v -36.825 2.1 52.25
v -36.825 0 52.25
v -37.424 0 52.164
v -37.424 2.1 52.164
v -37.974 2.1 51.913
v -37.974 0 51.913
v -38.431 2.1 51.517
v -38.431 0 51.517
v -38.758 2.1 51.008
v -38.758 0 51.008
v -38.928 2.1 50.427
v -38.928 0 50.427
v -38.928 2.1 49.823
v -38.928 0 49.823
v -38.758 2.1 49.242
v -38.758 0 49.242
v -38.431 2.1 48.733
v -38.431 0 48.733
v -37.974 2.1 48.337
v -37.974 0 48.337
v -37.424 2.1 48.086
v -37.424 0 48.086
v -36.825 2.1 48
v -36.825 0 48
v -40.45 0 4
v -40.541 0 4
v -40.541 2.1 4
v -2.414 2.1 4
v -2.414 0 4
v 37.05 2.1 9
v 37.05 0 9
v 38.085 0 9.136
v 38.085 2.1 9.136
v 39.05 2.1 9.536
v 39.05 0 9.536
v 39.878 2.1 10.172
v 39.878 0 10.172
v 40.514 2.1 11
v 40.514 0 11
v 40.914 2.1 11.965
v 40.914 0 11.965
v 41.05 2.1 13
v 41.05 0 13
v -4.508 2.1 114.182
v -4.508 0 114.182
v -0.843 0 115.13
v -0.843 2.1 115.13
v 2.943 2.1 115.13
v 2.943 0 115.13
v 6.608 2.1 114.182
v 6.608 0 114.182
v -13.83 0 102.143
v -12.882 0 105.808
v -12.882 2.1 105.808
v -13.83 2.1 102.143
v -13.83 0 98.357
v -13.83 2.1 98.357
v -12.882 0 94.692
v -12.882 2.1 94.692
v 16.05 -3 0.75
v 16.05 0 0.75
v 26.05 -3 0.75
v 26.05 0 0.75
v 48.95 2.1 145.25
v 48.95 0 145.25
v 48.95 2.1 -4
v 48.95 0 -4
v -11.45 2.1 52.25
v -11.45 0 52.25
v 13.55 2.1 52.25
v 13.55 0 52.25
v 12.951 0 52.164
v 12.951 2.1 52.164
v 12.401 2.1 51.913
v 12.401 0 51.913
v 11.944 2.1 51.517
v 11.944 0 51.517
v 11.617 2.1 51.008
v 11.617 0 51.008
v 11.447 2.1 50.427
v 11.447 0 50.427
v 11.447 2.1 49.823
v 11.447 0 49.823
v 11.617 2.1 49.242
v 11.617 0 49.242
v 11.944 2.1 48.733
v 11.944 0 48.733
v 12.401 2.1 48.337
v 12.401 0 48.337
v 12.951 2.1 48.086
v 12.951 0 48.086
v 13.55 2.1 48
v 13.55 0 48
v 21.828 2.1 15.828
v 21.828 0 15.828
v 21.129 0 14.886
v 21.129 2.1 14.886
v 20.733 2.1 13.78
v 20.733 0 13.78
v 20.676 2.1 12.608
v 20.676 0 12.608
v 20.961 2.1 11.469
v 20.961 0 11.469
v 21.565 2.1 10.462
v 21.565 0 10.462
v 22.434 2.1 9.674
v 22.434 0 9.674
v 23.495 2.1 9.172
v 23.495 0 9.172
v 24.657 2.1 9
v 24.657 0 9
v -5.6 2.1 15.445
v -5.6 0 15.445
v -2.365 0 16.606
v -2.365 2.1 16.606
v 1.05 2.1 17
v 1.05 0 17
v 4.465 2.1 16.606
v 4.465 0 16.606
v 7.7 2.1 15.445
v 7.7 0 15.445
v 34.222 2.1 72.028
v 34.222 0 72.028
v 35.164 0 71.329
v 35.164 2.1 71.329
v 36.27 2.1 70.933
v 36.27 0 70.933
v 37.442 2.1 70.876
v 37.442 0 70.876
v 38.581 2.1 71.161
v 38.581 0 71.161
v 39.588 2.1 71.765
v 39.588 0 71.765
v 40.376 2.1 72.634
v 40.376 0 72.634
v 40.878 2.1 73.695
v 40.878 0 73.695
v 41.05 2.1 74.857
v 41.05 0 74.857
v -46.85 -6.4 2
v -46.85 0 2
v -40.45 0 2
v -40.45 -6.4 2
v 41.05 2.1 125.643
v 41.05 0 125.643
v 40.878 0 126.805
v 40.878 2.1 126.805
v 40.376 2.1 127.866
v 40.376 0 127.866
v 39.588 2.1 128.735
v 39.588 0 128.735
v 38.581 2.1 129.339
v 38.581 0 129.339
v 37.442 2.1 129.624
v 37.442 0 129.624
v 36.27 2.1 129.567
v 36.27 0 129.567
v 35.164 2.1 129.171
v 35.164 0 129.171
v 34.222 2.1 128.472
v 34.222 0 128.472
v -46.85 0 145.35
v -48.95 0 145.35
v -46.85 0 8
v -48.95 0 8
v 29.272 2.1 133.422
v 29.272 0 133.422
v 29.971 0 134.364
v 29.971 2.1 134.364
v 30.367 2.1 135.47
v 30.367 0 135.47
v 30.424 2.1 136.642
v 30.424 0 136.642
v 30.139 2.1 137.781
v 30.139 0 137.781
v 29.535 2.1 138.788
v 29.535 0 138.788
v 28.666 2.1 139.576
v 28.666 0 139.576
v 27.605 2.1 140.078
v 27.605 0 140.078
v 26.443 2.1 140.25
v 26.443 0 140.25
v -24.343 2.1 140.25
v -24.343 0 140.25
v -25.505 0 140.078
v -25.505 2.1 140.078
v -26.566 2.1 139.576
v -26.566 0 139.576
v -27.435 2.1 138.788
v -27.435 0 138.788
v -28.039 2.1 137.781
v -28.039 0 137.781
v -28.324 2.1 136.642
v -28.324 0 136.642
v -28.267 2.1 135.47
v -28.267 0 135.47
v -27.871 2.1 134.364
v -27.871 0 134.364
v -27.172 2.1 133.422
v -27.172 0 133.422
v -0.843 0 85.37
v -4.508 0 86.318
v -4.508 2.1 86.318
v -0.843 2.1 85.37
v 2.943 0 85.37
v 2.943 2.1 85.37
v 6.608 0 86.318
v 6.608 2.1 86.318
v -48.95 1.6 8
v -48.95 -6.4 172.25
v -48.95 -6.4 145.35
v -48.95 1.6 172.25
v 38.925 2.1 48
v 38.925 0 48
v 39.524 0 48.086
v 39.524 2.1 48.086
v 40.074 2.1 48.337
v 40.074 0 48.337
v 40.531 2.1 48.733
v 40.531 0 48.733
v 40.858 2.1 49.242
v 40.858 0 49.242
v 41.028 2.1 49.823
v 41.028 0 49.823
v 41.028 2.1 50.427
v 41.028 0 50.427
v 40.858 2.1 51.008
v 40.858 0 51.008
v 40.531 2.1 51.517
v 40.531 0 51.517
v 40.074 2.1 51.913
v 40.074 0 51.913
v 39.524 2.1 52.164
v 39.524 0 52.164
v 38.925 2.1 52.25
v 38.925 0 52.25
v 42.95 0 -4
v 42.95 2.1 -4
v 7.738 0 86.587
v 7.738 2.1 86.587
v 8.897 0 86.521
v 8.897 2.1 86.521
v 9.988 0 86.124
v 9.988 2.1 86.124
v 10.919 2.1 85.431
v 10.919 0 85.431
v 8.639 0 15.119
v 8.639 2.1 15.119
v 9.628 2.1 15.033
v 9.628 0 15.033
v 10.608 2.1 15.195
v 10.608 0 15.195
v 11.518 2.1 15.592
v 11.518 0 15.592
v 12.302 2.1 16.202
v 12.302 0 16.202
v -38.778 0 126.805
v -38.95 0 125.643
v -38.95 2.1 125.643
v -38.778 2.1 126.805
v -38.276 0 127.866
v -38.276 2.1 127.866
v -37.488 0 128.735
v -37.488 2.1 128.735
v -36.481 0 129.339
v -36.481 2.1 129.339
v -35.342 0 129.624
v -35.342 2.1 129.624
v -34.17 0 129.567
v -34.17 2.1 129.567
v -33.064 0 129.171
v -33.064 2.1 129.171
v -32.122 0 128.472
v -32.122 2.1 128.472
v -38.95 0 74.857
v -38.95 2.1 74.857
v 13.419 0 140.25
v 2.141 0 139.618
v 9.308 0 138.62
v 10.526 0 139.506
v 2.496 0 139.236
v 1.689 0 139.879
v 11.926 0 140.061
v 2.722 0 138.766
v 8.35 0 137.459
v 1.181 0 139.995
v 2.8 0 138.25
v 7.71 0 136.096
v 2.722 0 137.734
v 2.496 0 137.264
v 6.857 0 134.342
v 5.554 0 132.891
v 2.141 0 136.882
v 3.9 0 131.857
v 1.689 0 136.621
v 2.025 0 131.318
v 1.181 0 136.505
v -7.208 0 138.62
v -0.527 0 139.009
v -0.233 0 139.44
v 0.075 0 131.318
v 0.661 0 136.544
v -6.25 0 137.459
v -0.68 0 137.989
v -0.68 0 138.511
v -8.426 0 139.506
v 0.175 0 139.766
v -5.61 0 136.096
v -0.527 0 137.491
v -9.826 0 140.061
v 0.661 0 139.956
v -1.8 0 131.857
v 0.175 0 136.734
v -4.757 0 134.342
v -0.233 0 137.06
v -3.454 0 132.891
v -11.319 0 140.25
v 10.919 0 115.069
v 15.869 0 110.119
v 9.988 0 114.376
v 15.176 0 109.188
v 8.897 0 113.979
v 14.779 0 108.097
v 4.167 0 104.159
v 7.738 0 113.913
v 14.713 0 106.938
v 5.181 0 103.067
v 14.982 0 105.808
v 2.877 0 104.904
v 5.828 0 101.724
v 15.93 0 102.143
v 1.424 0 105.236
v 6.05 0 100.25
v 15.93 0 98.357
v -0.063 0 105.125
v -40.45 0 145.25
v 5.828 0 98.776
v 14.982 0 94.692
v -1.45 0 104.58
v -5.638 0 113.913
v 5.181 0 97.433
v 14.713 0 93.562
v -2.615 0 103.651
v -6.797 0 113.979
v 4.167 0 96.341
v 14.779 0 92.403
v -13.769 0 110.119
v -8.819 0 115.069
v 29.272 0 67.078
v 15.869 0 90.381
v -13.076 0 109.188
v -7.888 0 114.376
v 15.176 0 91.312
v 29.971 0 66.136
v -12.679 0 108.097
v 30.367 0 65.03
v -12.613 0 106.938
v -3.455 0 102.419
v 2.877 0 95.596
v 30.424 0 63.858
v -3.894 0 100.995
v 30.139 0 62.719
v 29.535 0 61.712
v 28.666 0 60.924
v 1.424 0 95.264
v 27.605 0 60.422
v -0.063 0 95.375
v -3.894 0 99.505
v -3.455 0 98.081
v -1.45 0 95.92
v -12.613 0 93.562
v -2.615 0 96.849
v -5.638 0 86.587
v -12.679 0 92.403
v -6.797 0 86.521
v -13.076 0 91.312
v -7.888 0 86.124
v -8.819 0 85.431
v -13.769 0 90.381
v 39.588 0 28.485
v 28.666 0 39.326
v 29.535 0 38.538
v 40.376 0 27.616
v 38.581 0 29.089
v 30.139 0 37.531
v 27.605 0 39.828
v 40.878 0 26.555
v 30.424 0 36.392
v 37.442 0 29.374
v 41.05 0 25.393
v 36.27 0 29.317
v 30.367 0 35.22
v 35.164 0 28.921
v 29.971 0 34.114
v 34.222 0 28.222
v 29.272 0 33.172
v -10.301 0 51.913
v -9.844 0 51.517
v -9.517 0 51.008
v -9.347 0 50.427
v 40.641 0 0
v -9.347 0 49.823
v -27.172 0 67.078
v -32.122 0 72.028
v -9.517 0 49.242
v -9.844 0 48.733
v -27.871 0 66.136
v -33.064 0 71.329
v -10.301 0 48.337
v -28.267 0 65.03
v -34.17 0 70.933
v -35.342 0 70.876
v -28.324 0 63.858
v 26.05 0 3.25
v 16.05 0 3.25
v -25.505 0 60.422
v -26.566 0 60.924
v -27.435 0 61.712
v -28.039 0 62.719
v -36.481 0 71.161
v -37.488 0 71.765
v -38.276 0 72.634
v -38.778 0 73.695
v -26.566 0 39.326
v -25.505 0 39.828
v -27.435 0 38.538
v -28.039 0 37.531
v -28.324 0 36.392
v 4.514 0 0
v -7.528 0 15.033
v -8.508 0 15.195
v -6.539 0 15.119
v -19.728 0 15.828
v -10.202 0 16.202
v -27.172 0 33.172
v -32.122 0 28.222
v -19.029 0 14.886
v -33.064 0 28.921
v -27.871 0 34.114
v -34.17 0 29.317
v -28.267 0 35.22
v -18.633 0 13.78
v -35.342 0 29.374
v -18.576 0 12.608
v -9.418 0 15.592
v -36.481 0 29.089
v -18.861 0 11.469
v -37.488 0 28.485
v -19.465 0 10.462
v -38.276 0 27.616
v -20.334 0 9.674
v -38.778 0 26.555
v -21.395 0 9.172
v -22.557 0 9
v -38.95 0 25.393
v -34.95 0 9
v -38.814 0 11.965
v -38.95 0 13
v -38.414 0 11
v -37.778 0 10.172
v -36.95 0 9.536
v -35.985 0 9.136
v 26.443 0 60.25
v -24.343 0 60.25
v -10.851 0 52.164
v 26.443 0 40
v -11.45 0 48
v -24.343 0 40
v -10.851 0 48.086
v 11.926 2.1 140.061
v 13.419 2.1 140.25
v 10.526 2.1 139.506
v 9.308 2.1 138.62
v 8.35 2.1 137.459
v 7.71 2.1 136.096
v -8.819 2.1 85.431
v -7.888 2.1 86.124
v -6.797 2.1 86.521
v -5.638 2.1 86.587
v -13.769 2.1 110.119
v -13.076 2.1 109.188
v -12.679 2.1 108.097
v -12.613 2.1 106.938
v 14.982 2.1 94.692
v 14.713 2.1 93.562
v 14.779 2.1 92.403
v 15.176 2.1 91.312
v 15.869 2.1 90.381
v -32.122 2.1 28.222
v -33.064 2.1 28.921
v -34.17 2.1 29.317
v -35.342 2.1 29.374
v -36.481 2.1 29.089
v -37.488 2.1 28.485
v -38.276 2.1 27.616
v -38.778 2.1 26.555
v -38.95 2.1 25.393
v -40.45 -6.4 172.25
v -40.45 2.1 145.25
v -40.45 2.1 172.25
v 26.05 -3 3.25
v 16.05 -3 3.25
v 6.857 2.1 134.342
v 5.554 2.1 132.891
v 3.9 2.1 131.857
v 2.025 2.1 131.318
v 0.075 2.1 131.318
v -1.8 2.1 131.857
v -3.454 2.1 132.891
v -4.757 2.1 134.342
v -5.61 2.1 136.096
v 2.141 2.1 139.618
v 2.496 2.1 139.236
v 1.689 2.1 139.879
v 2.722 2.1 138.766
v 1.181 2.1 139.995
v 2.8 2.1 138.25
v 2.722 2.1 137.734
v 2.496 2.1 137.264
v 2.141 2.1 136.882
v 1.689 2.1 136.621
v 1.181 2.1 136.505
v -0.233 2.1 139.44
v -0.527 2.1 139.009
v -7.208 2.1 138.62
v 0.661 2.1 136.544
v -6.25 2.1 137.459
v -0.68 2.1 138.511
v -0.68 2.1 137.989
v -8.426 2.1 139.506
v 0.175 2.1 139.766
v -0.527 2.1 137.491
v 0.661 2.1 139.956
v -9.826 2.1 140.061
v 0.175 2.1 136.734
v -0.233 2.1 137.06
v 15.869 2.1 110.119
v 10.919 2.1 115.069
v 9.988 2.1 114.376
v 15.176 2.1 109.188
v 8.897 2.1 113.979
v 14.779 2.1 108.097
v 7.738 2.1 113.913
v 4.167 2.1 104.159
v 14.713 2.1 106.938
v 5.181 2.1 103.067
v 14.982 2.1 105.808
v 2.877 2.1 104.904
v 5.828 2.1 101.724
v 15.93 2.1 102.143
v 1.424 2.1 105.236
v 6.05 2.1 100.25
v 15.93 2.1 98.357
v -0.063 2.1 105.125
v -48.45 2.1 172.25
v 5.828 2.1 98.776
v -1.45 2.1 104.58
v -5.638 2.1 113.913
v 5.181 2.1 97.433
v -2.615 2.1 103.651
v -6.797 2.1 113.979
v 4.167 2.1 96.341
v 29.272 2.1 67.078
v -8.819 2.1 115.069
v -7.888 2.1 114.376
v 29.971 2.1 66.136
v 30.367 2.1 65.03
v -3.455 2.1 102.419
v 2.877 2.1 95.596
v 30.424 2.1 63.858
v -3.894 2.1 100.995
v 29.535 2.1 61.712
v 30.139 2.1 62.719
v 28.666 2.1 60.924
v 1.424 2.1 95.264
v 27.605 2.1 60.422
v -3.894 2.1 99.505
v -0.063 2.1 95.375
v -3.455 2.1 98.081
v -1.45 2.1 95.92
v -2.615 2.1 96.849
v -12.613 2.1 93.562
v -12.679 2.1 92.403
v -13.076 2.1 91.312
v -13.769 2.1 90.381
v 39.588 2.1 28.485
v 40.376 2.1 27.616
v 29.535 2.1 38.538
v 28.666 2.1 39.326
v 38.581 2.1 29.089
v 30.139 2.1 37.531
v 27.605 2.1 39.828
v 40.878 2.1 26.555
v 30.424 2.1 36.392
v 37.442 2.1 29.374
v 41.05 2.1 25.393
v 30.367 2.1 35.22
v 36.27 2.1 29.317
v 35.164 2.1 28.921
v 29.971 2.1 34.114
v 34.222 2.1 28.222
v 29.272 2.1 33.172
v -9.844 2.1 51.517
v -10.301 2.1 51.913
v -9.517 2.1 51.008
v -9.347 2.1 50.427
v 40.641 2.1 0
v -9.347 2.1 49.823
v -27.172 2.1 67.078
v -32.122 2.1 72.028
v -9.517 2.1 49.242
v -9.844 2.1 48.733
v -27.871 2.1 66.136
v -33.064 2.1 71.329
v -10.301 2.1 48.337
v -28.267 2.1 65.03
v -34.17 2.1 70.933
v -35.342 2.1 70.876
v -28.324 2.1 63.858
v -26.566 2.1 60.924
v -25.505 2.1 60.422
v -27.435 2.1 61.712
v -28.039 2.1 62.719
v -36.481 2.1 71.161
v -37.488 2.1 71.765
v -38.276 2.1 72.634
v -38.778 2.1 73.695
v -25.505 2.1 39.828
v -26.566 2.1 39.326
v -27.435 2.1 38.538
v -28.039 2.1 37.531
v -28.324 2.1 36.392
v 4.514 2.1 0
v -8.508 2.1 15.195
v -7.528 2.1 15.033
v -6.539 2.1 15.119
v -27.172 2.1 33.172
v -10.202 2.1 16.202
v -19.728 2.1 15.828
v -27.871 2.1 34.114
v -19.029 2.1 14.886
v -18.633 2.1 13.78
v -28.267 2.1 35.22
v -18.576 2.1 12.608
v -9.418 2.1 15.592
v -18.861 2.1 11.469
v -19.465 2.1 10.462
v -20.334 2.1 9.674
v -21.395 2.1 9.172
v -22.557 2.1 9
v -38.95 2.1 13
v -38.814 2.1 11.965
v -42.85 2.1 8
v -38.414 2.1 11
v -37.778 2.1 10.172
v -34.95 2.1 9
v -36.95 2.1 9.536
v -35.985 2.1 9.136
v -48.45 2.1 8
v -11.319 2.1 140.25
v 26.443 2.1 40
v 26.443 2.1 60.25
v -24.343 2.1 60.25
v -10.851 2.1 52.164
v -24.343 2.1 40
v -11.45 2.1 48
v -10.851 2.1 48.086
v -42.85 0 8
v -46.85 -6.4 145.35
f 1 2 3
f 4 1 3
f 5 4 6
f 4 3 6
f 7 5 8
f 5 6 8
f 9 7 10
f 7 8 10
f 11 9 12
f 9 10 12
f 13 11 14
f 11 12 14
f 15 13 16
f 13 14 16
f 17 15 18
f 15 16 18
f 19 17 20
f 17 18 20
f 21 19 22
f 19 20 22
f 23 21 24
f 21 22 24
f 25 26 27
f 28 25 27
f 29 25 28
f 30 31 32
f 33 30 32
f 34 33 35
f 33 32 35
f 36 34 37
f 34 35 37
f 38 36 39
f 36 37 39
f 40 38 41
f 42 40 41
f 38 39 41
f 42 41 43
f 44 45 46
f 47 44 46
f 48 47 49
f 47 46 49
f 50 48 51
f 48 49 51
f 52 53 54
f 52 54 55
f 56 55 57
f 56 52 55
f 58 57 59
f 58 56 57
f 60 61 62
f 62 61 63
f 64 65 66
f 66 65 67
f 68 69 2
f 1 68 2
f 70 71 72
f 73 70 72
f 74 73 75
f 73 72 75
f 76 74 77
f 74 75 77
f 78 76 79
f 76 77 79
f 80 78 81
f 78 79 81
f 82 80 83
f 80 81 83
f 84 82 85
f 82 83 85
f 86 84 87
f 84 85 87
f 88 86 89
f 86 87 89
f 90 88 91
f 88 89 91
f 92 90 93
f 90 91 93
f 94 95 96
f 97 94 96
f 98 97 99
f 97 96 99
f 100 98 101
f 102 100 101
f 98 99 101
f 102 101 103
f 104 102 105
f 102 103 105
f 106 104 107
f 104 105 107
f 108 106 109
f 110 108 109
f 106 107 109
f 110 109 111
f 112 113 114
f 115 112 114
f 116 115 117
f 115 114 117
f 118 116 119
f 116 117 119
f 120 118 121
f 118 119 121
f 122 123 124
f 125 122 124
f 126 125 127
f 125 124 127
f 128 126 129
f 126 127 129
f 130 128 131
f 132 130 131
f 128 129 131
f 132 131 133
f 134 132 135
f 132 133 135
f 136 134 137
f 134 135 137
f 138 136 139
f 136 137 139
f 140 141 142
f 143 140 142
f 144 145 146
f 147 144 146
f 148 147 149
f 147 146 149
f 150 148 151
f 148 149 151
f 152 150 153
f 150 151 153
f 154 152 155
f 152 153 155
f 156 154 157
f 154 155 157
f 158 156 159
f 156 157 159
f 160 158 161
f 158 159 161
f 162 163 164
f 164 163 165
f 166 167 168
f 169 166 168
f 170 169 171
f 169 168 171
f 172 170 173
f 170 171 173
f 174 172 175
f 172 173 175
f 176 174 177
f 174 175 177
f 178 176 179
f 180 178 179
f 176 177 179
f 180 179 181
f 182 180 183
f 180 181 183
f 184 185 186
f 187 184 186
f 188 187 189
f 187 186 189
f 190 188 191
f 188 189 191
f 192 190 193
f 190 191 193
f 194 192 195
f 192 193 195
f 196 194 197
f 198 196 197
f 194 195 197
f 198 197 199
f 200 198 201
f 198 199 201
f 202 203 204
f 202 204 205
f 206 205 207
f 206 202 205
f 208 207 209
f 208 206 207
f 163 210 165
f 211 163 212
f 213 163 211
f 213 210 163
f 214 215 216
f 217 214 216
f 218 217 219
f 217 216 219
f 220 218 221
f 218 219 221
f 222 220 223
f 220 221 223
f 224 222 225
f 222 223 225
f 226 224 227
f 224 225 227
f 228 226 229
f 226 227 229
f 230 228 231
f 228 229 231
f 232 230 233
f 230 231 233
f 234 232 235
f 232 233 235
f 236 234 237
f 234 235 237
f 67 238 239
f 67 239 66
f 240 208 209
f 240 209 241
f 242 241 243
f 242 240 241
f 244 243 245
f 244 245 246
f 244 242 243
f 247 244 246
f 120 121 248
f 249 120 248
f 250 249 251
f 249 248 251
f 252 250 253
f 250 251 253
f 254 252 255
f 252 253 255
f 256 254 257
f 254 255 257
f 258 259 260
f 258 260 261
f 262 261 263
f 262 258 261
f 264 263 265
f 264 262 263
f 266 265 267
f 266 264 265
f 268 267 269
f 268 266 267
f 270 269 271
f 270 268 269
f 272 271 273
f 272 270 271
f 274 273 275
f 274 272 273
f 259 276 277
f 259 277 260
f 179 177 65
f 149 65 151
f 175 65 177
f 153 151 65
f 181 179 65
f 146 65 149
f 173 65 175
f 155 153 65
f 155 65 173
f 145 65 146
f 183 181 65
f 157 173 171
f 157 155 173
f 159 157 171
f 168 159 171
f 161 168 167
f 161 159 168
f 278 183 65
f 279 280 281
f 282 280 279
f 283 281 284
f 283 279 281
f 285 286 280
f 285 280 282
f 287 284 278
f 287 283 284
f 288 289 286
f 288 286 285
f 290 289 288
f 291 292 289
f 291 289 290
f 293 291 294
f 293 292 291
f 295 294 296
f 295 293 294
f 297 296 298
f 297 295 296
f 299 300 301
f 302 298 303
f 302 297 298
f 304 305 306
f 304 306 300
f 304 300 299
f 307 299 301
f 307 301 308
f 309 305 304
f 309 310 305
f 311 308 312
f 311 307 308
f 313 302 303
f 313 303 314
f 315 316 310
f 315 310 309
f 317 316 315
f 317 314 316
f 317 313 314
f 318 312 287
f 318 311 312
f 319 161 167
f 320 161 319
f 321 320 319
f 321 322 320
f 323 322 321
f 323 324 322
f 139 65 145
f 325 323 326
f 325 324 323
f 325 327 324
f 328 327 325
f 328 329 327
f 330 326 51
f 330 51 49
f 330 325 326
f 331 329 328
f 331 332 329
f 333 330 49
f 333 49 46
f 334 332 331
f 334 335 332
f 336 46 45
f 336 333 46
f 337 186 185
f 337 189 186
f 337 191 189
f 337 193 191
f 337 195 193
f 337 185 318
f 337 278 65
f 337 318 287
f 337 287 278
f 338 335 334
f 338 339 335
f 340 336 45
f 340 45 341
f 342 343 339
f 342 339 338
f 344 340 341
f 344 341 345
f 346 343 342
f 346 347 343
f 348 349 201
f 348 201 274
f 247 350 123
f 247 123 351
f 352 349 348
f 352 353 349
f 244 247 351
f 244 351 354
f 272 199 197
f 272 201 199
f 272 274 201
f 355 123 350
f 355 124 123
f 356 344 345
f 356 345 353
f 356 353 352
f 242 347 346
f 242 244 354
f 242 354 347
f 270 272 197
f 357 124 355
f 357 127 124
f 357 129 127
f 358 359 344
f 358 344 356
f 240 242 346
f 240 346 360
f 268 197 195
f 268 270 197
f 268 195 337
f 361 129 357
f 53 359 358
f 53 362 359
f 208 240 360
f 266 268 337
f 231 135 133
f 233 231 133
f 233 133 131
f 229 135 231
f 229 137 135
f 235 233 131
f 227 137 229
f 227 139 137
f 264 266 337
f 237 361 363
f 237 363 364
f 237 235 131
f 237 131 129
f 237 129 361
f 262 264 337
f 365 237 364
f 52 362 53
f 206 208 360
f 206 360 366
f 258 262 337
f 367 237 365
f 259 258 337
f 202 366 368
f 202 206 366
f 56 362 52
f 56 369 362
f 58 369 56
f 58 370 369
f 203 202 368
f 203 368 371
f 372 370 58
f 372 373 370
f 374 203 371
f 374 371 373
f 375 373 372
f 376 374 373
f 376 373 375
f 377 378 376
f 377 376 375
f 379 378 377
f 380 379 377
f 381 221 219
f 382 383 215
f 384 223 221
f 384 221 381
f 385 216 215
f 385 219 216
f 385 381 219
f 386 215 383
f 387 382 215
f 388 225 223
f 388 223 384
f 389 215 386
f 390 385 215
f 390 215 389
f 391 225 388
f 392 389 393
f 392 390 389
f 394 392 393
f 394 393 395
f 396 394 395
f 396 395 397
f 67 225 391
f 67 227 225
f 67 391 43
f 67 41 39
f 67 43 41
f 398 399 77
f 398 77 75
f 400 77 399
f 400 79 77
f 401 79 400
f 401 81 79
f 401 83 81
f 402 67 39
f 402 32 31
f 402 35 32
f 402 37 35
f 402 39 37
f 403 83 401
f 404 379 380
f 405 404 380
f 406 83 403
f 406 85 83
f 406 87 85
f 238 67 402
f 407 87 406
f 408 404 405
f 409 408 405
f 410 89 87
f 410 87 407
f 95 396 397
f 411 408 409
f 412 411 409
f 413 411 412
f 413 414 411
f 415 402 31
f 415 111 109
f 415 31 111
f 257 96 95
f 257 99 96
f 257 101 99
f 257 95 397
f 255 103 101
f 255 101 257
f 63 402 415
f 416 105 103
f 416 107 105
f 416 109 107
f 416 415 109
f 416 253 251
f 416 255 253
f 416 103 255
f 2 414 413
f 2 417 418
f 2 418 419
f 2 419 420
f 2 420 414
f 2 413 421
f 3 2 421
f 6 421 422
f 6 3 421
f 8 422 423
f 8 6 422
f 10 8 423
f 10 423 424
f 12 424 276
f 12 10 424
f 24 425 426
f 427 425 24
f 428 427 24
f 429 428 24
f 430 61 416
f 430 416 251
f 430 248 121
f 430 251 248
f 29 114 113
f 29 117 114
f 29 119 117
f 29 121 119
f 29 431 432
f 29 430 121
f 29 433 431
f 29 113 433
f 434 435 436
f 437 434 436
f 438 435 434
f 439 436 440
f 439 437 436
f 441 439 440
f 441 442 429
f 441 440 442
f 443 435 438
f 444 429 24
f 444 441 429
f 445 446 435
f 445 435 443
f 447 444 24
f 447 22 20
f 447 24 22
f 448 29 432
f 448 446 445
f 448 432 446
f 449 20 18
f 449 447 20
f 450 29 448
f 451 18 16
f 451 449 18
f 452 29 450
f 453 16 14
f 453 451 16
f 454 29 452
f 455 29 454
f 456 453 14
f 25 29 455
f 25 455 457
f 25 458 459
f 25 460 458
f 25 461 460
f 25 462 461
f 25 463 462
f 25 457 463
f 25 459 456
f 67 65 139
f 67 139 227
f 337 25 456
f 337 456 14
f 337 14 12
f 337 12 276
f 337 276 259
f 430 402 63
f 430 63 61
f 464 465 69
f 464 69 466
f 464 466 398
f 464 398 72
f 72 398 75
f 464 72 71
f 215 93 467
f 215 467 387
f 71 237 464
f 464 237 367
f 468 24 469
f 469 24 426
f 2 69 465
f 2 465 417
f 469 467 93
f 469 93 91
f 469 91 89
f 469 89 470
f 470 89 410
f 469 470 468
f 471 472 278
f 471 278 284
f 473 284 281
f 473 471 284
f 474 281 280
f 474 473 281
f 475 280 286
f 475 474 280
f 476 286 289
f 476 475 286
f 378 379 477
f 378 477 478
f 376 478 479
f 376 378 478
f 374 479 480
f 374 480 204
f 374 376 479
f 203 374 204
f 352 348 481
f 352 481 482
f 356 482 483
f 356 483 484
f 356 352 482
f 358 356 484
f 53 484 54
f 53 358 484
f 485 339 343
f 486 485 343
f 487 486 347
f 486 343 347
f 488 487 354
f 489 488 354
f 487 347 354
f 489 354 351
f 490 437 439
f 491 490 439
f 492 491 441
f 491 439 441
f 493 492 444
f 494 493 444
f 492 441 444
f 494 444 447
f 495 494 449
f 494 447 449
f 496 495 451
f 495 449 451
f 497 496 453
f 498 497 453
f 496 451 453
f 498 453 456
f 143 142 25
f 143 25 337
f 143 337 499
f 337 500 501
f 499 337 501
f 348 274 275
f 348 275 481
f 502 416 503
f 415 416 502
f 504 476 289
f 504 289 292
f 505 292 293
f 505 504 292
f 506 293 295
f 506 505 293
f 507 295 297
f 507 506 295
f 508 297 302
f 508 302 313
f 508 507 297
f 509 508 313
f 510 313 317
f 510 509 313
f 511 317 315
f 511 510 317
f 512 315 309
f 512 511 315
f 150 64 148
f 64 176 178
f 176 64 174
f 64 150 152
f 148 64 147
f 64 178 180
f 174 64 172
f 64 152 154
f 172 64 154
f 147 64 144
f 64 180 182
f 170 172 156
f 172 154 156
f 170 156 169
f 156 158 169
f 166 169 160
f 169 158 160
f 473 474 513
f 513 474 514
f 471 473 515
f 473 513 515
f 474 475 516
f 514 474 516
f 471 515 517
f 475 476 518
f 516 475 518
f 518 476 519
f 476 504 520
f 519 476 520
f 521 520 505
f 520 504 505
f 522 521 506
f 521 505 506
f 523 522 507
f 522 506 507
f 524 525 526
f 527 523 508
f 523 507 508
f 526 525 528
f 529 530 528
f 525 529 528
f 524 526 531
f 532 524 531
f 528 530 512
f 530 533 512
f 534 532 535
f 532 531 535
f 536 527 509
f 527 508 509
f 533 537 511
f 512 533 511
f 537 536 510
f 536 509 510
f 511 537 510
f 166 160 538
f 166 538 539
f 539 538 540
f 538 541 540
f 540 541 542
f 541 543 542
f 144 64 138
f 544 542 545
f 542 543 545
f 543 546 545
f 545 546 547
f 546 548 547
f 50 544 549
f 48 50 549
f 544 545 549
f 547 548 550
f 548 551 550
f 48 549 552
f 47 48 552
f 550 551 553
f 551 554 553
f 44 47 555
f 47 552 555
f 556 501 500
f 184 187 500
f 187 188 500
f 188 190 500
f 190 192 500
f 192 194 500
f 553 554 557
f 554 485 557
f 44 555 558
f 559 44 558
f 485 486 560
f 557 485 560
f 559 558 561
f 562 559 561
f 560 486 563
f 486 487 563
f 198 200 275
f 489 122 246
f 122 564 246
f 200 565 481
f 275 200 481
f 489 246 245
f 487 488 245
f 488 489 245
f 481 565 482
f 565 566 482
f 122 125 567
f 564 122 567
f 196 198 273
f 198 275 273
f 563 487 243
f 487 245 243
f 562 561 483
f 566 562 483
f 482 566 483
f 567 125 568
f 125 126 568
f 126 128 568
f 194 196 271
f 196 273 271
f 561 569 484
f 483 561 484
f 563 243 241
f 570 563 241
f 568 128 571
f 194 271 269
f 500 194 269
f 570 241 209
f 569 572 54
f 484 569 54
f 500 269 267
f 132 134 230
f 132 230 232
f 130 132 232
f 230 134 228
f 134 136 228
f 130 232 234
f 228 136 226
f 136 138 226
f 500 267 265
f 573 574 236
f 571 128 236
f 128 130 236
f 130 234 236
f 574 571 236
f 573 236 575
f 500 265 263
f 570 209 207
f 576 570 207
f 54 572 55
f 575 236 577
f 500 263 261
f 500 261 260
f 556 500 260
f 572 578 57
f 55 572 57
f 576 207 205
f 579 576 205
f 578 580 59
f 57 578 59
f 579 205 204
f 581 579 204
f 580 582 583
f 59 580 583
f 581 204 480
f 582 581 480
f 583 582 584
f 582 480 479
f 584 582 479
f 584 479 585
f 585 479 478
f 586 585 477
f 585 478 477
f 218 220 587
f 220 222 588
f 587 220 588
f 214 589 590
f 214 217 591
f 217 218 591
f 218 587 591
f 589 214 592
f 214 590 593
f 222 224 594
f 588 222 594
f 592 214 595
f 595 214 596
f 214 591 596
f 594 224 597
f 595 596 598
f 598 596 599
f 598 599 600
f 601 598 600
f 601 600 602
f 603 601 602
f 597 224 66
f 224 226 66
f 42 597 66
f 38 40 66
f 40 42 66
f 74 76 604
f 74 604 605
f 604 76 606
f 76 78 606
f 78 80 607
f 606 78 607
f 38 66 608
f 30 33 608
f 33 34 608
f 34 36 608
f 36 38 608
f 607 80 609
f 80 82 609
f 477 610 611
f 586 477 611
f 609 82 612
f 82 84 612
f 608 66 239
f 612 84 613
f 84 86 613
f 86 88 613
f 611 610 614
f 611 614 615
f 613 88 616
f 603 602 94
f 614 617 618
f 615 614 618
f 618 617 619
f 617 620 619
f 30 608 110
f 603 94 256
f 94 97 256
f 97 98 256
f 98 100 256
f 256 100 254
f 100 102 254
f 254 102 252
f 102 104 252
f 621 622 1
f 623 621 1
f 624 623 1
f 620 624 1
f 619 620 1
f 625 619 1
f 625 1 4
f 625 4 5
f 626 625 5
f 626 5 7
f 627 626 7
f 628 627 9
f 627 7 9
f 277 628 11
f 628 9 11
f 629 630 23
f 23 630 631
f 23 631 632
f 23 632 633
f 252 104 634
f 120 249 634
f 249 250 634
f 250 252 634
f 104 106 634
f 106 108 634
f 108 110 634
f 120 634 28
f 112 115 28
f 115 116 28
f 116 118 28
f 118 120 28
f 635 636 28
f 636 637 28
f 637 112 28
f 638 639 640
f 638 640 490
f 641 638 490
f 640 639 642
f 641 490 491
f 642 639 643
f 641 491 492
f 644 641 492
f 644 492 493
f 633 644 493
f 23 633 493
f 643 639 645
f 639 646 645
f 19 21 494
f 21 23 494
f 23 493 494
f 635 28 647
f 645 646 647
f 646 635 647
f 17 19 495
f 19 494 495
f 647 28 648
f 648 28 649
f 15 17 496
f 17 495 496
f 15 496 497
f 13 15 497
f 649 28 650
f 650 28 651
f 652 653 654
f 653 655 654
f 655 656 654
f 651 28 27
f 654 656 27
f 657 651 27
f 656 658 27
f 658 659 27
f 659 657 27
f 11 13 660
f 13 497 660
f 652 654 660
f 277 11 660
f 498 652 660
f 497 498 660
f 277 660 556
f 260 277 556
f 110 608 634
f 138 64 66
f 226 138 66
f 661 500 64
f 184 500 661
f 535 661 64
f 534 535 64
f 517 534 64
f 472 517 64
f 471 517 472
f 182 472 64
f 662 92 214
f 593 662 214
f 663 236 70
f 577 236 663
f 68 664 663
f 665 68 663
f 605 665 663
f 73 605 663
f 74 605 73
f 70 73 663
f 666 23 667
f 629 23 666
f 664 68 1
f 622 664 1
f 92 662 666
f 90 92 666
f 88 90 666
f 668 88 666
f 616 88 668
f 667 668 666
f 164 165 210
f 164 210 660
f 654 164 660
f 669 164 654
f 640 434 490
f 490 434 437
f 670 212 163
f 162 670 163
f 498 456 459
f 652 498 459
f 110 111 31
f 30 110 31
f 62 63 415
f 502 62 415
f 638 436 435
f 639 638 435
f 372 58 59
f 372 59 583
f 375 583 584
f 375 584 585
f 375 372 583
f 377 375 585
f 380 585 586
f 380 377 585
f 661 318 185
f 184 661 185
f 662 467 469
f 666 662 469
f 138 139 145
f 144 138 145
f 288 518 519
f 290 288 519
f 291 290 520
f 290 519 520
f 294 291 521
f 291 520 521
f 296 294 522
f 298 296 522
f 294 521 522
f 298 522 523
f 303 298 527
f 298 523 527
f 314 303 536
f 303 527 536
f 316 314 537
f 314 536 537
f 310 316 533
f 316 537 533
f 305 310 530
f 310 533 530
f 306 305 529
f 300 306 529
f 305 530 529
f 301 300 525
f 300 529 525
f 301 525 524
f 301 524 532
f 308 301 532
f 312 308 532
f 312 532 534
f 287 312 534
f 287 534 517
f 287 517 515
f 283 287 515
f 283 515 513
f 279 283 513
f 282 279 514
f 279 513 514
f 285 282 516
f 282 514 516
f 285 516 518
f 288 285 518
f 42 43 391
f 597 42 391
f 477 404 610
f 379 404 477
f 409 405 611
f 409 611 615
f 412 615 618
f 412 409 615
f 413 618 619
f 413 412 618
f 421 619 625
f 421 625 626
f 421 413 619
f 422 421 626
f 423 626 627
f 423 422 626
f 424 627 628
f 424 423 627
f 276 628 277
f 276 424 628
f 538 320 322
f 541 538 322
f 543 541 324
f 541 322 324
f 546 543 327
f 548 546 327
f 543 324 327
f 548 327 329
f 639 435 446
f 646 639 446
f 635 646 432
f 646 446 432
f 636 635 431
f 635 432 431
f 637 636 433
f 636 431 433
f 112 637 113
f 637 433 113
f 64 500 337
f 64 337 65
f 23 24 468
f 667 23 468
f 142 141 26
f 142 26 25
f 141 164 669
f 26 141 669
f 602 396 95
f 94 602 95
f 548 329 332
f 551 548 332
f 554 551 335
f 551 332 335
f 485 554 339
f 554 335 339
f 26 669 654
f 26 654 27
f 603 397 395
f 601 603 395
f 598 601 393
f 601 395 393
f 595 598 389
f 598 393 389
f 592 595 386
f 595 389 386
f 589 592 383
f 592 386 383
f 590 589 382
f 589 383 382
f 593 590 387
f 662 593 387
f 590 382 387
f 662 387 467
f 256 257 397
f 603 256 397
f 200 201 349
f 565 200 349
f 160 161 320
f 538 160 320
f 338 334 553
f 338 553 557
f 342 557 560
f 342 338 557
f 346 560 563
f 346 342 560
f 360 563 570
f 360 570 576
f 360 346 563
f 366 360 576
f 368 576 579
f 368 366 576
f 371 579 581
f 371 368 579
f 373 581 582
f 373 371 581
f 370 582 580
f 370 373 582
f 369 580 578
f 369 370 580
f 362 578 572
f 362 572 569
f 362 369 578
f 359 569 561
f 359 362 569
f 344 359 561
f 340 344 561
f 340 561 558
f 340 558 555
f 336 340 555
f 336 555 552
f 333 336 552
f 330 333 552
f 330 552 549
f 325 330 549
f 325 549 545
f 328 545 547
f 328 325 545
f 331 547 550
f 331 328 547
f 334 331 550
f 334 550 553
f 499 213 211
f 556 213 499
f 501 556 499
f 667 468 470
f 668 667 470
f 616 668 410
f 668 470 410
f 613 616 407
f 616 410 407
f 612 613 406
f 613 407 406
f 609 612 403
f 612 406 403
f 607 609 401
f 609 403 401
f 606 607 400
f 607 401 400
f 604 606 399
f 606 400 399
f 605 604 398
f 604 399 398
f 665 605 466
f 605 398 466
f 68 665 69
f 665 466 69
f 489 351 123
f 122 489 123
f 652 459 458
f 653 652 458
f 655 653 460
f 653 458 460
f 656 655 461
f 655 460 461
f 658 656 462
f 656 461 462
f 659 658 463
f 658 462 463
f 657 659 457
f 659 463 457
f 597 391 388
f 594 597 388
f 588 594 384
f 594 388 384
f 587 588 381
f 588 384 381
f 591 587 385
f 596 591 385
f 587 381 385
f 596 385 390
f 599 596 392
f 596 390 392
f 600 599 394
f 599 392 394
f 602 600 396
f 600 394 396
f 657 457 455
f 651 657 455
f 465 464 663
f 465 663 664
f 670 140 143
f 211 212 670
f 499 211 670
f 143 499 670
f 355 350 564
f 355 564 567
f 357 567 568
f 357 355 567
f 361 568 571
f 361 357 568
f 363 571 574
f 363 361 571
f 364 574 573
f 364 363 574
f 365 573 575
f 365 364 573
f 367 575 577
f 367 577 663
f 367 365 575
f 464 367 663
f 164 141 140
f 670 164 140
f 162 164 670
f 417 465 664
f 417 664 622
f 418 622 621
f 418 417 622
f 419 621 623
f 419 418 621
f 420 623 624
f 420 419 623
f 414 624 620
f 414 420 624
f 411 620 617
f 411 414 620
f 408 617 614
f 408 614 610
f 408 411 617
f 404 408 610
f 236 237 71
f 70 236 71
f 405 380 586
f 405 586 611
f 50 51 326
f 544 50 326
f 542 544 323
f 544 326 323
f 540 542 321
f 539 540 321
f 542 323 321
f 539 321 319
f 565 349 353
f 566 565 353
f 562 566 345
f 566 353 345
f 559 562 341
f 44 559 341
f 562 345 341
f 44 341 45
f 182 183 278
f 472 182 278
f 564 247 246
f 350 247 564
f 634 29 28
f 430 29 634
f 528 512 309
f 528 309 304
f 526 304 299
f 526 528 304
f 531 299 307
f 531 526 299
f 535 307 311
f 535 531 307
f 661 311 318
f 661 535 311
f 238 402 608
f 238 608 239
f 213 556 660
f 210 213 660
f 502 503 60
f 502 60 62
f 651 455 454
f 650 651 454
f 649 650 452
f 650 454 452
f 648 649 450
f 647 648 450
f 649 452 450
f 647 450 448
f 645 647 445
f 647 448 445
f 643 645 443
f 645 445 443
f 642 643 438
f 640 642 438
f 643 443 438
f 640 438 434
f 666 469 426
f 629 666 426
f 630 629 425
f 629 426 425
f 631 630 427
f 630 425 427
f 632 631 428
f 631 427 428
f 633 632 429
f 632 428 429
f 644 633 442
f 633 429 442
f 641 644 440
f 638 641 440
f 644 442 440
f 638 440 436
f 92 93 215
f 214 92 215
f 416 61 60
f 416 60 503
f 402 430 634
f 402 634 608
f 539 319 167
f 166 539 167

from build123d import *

# Parameters (mm, degrees)
SKETCH1_R           = 5
BOSS_EXTRUDE1_DEPTH = 2.1
SKETCH5_W           = 8.5
SKETCH5_H           = 170.25
BOSS_EXTRUDE3_DEPTH = 6.4
CUT_EXTRUDE2_DEPTH  = 2.1
SKETCH7_W           = 10
SKETCH7_H           = 2.5
BOSS_EXTRUDE4_DEPTH = 3
CHAMFER1_SIZE       = 0.5
SKETCH8_W           = 89.4
SKETCH8_H           = 20
CUT_EXTRUDE3_DEPTH  = 9.5
SKETCH9_R           = 1.75
BOSS_EXTRUDE8_DEPTH = 2.1


with BuildPart() as part:
    # Sketch1 → Boss-Extrude1 (new body)
    with BuildSketch(Plane(origin=(0, 0, 0), x_dir=(1, 0, 0), z_dir=(0, 1, 0))):
        Polygon((-48.95, -172.25), (-48.95, -8), (-42.85, -8), (-40.540598923, -4), (-2.414101615, -4), (4.514101615, 0), (40.640598923, 0), (42.95, 4), (48.95, 4), (48.95, -7.35), (48.95, -165.25), (-40.45, -165.25), (-40.45, -172.25), align=None)
        with Locations((1.05, -100.25)):
            Circle(SKETCH1_R, mode=Mode.SUBTRACT)
        with BuildLine():
            Line((-27.171825407, -133.421572875), (-8.819153161, -115.06890063))
            ThreePointArc((-8.819153161, -115.06890063), (-6.796732371, -113.979375), (-4.508467924, -114.182100859))
            ThreePointArc((-4.508467924, -114.182100859), (1.05, -115.25), (6.608467924, -114.182100859))
            ThreePointArc((6.608467924, -114.182100859), (8.896732371, -113.979375), (10.919153161, -115.06890063))
            Line((10.919153161, -115.06890063), (29.271825407, -133.421572875))
            ThreePointArc((29.271825407, -133.421572875), (30.138916412, -137.780733729), (26.443398282, -140.25))
            Line((26.443398282, -140.25), (-24.343398282, -140.25))
            ThreePointArc((-24.343398282, -140.25), (-28.038916412, -137.780733729), (-27.171825407, -133.421572875))
        make_face(mode=Mode.SUBTRACT)
        with BuildLine():
            Line((-34.95, -9), (-22.556601718, -9))
            ThreePointArc((-22.556601718, -9), (-18.861083588, -11.469266271), (-19.728174593, -15.828427125))
            Line((-19.728174593, -15.828427125), (-32.121572875, -28.221825407))
            ThreePointArc((-32.121572875, -28.221825407), (-36.480733729, -29.088916412), (-38.95, -25.393398282))
            Line((-38.95, -25.393398282), (-38.95, -13))
            ThreePointArc((-38.95, -13), (-37.778427125, -10.171572875), (-34.95, -9))
        make_face(mode=Mode.SUBTRACT)
        with BuildLine():
            Line((41.05, -13), (41.05, -25.393398282))
            ThreePointArc((41.05, -25.393398282), (38.580733729, -29.088916412), (34.221572875, -28.221825407))
            Line((34.221572875, -28.221825407), (21.828174593, -15.828427125))
            ThreePointArc((21.828174593, -15.828427125), (20.961083588, -11.469266271), (24.656601718, -9))
            Line((24.656601718, -9), (37.05, -9))
            ThreePointArc((37.05, -9), (39.878427125, -10.171572875), (41.05, -13))
        make_face(mode=Mode.SUBTRACT)
        with BuildLine():
            Line((-32.121572875, -128.471825407), (-13.76890063, -110.119153161))
            ThreePointArc((-13.76890063, -110.119153161), (-12.679375, -108.096732371), (-12.882100859, -105.808467924))
            ThreePointArc((-12.882100859, -105.808467924), (-13.95, -100.25), (-12.882100859, -94.691532076))
            ThreePointArc((-12.882100859, -94.691532076), (-12.679375, -92.403267629), (-13.76890063, -90.380846839))
            Line((-13.76890063, -90.380846839), (-32.121572875, -72.028174593))
            ThreePointArc((-32.121572875, -72.028174593), (-36.480733729, -71.161083588), (-38.95, -74.856601718))
            Line((-38.95, -74.856601718), (-38.95, -125.643398282))
            ThreePointArc((-38.95, -125.643398282), (-36.480733729, -129.338916412), (-32.121572875, -128.471825407))
        make_face(mode=Mode.SUBTRACT)
        with BuildLine():
            Line((34.221572875, -128.471825407), (15.86890063, -110.119153161))
            ThreePointArc((15.86890063, -110.119153161), (14.779375, -108.096732371), (14.982100859, -105.808467924))
            ThreePointArc((14.982100859, -105.808467924), (16.05, -100.25), (14.982100859, -94.691532076))
            ThreePointArc((14.982100859, -94.691532076), (14.779375, -92.403267629), (15.86890063, -90.380846839))
            Line((15.86890063, -90.380846839), (34.221572875, -72.028174593))
            ThreePointArc((34.221572875, -72.028174593), (38.580733729, -71.161083588), (41.05, -74.856601718))
            Line((41.05, -74.856601718), (41.05, -125.643398282))
            ThreePointArc((41.05, -125.643398282), (38.580733729, -129.338916412), (34.221572875, -128.471825407))
        make_face(mode=Mode.SUBTRACT)
        with BuildLine():
            Line((10.919153161, -85.43109937), (29.271825407, -67.078427125))
            ThreePointArc((29.271825407, -67.078427125), (30.138916412, -62.719266271), (26.443398282, -60.25))
            Line((26.443398282, -60.25), (-24.343398282, -60.25))
            ThreePointArc((-24.343398282, -60.25), (-28.038916412, -62.719266271), (-27.171825407, -67.078427125))
            Line((-27.171825407, -67.078427125), (-8.819153161, -85.43109937))
            ThreePointArc((-8.819153161, -85.43109937), (-6.796732371, -86.520625), (-4.508467924, -86.317899141))
            ThreePointArc((-4.508467924, -86.317899141), (1.05, -85.25), (6.608467924, -86.317899141))
            ThreePointArc((6.608467924, -86.317899141), (8.896732371, -86.520625), (10.919153161, -85.43109937))
        make_face(mode=Mode.SUBTRACT)
        with BuildLine():
            Line((-27.171825407, -33.171572875), (-10.202325554, -16.202073022))
            ThreePointArc((-10.202325554, -16.202073022), (-8.02311566, -15.083537139), (-5.600446128, -15.445131695))
            ThreePointArc((-5.600446128, -15.445131695), (1.05, -17), (7.700446128, -15.445131695))
            ThreePointArc((7.700446128, -15.445131695), (10.12311566, -15.083537139), (12.302325554, -16.202073022))
            Line((12.302325554, -16.202073022), (29.271825407, -33.171572875))
            ThreePointArc((29.271825407, -33.171572875), (30.138916412, -37.530733729), (26.443398282, -40))
            Line((26.443398282, -40), (-24.343398282, -40))
            ThreePointArc((-24.343398282, -40), (-28.038916412, -37.530733729), (-27.171825407, -33.171572875))
        make_face(mode=Mode.SUBTRACT)
        with BuildLine():
            Line((-36.825, -48), (-11.45, -48))
            ThreePointArc((-11.45, -48), (-9.325, -50.125), (-11.45, -52.25))
            Line((-11.45, -52.25), (-36.825, -52.25))
            ThreePointArc((-36.825, -52.25), (-38.95, -50.125), (-36.825, -48))
        make_face(mode=Mode.SUBTRACT)
        with BuildLine():
            Line((13.55, -48), (38.925, -48))
            ThreePointArc((38.925, -48), (41.05, -50.125), (38.925, -52.25))
            Line((38.925, -52.25), (13.55, -52.25))
            ThreePointArc((13.55, -52.25), (11.425, -50.125), (13.55, -48))
        make_face(mode=Mode.SUBTRACT)
    extrude(amount=BOSS_EXTRUDE1_DEPTH)

    # Sketch5 → Boss-Extrude3 (add)
    with BuildSketch(Plane.XZ):
        with Locations((-44.7, 87.125)):
            Rectangle(SKETCH5_W, SKETCH5_H)
    extrude(amount=BOSS_EXTRUDE3_DEPTH)

    # Sketch6 → Cut-Extrude2 (cut)
    with BuildSketch(Plane.ZY.offset(48.95)):
        Polygon((8, 0), (2, 0), (2, -6.4), (145.35, -6.4), (145.35, 0), (140.25, 0), align=None)
    extrude(amount=-CUT_EXTRUDE2_DEPTH, mode=Mode.SUBTRACT)

    # Sketch7 → Boss-Extrude4 (add)
    with BuildSketch(Plane.XZ):
        with Locations((21.05, 2)):
            Rectangle(SKETCH7_W, SKETCH7_H)
    extrude(amount=BOSS_EXTRUDE4_DEPTH)

    # Chamfer1
    chamfer1_edges = [part.edges().sort_by_distance(p)[0] for p in [
        (-48.95, 2.1, 90.125),
    ]]
    chamfer(chamfer1_edges, length=CHAMFER1_SIZE)

    # Sketch8 → Cut-Extrude3 (cut, through all)
    with BuildSketch(Plane(origin=(0, 2.1, 0), x_dir=(1, 0, 0), z_dir=(0, 1, 0))):
        with Locations((4.25, -155.25)):
            Rectangle(SKETCH8_W, SKETCH8_H)
    extrude(amount=-CUT_EXTRUDE3_DEPTH, mode=Mode.SUBTRACT)

    # Sketch9 → Boss-Extrude8 (add)
    with BuildSketch(Plane(origin=(0, 2.1, 0), x_dir=(1, 0, 0), z_dir=(0, 1, 0))):
        with BuildLine():
            Line((-11.319316877, -140.25), (13.419316877, -140.25))
            ThreePointArc((13.419316877, -140.25), (9.889226444, -139.10164524), (7.710401395, -136.096153846))
            ThreePointArc((7.710401395, -136.096153846), (1.05, -131.25), (-5.610401395, -136.096153846))
            ThreePointArc((-5.610401395, -136.096153846), (-7.789226444, -139.10164524), (-11.319316877, -140.25))
        make_face()
        with Locations((1.05, -138.25)):
            Circle(SKETCH9_R, mode=Mode.SUBTRACT)
    extrude(amount=-BOSS_EXTRUDE8_DEPTH)


solid = part.part
